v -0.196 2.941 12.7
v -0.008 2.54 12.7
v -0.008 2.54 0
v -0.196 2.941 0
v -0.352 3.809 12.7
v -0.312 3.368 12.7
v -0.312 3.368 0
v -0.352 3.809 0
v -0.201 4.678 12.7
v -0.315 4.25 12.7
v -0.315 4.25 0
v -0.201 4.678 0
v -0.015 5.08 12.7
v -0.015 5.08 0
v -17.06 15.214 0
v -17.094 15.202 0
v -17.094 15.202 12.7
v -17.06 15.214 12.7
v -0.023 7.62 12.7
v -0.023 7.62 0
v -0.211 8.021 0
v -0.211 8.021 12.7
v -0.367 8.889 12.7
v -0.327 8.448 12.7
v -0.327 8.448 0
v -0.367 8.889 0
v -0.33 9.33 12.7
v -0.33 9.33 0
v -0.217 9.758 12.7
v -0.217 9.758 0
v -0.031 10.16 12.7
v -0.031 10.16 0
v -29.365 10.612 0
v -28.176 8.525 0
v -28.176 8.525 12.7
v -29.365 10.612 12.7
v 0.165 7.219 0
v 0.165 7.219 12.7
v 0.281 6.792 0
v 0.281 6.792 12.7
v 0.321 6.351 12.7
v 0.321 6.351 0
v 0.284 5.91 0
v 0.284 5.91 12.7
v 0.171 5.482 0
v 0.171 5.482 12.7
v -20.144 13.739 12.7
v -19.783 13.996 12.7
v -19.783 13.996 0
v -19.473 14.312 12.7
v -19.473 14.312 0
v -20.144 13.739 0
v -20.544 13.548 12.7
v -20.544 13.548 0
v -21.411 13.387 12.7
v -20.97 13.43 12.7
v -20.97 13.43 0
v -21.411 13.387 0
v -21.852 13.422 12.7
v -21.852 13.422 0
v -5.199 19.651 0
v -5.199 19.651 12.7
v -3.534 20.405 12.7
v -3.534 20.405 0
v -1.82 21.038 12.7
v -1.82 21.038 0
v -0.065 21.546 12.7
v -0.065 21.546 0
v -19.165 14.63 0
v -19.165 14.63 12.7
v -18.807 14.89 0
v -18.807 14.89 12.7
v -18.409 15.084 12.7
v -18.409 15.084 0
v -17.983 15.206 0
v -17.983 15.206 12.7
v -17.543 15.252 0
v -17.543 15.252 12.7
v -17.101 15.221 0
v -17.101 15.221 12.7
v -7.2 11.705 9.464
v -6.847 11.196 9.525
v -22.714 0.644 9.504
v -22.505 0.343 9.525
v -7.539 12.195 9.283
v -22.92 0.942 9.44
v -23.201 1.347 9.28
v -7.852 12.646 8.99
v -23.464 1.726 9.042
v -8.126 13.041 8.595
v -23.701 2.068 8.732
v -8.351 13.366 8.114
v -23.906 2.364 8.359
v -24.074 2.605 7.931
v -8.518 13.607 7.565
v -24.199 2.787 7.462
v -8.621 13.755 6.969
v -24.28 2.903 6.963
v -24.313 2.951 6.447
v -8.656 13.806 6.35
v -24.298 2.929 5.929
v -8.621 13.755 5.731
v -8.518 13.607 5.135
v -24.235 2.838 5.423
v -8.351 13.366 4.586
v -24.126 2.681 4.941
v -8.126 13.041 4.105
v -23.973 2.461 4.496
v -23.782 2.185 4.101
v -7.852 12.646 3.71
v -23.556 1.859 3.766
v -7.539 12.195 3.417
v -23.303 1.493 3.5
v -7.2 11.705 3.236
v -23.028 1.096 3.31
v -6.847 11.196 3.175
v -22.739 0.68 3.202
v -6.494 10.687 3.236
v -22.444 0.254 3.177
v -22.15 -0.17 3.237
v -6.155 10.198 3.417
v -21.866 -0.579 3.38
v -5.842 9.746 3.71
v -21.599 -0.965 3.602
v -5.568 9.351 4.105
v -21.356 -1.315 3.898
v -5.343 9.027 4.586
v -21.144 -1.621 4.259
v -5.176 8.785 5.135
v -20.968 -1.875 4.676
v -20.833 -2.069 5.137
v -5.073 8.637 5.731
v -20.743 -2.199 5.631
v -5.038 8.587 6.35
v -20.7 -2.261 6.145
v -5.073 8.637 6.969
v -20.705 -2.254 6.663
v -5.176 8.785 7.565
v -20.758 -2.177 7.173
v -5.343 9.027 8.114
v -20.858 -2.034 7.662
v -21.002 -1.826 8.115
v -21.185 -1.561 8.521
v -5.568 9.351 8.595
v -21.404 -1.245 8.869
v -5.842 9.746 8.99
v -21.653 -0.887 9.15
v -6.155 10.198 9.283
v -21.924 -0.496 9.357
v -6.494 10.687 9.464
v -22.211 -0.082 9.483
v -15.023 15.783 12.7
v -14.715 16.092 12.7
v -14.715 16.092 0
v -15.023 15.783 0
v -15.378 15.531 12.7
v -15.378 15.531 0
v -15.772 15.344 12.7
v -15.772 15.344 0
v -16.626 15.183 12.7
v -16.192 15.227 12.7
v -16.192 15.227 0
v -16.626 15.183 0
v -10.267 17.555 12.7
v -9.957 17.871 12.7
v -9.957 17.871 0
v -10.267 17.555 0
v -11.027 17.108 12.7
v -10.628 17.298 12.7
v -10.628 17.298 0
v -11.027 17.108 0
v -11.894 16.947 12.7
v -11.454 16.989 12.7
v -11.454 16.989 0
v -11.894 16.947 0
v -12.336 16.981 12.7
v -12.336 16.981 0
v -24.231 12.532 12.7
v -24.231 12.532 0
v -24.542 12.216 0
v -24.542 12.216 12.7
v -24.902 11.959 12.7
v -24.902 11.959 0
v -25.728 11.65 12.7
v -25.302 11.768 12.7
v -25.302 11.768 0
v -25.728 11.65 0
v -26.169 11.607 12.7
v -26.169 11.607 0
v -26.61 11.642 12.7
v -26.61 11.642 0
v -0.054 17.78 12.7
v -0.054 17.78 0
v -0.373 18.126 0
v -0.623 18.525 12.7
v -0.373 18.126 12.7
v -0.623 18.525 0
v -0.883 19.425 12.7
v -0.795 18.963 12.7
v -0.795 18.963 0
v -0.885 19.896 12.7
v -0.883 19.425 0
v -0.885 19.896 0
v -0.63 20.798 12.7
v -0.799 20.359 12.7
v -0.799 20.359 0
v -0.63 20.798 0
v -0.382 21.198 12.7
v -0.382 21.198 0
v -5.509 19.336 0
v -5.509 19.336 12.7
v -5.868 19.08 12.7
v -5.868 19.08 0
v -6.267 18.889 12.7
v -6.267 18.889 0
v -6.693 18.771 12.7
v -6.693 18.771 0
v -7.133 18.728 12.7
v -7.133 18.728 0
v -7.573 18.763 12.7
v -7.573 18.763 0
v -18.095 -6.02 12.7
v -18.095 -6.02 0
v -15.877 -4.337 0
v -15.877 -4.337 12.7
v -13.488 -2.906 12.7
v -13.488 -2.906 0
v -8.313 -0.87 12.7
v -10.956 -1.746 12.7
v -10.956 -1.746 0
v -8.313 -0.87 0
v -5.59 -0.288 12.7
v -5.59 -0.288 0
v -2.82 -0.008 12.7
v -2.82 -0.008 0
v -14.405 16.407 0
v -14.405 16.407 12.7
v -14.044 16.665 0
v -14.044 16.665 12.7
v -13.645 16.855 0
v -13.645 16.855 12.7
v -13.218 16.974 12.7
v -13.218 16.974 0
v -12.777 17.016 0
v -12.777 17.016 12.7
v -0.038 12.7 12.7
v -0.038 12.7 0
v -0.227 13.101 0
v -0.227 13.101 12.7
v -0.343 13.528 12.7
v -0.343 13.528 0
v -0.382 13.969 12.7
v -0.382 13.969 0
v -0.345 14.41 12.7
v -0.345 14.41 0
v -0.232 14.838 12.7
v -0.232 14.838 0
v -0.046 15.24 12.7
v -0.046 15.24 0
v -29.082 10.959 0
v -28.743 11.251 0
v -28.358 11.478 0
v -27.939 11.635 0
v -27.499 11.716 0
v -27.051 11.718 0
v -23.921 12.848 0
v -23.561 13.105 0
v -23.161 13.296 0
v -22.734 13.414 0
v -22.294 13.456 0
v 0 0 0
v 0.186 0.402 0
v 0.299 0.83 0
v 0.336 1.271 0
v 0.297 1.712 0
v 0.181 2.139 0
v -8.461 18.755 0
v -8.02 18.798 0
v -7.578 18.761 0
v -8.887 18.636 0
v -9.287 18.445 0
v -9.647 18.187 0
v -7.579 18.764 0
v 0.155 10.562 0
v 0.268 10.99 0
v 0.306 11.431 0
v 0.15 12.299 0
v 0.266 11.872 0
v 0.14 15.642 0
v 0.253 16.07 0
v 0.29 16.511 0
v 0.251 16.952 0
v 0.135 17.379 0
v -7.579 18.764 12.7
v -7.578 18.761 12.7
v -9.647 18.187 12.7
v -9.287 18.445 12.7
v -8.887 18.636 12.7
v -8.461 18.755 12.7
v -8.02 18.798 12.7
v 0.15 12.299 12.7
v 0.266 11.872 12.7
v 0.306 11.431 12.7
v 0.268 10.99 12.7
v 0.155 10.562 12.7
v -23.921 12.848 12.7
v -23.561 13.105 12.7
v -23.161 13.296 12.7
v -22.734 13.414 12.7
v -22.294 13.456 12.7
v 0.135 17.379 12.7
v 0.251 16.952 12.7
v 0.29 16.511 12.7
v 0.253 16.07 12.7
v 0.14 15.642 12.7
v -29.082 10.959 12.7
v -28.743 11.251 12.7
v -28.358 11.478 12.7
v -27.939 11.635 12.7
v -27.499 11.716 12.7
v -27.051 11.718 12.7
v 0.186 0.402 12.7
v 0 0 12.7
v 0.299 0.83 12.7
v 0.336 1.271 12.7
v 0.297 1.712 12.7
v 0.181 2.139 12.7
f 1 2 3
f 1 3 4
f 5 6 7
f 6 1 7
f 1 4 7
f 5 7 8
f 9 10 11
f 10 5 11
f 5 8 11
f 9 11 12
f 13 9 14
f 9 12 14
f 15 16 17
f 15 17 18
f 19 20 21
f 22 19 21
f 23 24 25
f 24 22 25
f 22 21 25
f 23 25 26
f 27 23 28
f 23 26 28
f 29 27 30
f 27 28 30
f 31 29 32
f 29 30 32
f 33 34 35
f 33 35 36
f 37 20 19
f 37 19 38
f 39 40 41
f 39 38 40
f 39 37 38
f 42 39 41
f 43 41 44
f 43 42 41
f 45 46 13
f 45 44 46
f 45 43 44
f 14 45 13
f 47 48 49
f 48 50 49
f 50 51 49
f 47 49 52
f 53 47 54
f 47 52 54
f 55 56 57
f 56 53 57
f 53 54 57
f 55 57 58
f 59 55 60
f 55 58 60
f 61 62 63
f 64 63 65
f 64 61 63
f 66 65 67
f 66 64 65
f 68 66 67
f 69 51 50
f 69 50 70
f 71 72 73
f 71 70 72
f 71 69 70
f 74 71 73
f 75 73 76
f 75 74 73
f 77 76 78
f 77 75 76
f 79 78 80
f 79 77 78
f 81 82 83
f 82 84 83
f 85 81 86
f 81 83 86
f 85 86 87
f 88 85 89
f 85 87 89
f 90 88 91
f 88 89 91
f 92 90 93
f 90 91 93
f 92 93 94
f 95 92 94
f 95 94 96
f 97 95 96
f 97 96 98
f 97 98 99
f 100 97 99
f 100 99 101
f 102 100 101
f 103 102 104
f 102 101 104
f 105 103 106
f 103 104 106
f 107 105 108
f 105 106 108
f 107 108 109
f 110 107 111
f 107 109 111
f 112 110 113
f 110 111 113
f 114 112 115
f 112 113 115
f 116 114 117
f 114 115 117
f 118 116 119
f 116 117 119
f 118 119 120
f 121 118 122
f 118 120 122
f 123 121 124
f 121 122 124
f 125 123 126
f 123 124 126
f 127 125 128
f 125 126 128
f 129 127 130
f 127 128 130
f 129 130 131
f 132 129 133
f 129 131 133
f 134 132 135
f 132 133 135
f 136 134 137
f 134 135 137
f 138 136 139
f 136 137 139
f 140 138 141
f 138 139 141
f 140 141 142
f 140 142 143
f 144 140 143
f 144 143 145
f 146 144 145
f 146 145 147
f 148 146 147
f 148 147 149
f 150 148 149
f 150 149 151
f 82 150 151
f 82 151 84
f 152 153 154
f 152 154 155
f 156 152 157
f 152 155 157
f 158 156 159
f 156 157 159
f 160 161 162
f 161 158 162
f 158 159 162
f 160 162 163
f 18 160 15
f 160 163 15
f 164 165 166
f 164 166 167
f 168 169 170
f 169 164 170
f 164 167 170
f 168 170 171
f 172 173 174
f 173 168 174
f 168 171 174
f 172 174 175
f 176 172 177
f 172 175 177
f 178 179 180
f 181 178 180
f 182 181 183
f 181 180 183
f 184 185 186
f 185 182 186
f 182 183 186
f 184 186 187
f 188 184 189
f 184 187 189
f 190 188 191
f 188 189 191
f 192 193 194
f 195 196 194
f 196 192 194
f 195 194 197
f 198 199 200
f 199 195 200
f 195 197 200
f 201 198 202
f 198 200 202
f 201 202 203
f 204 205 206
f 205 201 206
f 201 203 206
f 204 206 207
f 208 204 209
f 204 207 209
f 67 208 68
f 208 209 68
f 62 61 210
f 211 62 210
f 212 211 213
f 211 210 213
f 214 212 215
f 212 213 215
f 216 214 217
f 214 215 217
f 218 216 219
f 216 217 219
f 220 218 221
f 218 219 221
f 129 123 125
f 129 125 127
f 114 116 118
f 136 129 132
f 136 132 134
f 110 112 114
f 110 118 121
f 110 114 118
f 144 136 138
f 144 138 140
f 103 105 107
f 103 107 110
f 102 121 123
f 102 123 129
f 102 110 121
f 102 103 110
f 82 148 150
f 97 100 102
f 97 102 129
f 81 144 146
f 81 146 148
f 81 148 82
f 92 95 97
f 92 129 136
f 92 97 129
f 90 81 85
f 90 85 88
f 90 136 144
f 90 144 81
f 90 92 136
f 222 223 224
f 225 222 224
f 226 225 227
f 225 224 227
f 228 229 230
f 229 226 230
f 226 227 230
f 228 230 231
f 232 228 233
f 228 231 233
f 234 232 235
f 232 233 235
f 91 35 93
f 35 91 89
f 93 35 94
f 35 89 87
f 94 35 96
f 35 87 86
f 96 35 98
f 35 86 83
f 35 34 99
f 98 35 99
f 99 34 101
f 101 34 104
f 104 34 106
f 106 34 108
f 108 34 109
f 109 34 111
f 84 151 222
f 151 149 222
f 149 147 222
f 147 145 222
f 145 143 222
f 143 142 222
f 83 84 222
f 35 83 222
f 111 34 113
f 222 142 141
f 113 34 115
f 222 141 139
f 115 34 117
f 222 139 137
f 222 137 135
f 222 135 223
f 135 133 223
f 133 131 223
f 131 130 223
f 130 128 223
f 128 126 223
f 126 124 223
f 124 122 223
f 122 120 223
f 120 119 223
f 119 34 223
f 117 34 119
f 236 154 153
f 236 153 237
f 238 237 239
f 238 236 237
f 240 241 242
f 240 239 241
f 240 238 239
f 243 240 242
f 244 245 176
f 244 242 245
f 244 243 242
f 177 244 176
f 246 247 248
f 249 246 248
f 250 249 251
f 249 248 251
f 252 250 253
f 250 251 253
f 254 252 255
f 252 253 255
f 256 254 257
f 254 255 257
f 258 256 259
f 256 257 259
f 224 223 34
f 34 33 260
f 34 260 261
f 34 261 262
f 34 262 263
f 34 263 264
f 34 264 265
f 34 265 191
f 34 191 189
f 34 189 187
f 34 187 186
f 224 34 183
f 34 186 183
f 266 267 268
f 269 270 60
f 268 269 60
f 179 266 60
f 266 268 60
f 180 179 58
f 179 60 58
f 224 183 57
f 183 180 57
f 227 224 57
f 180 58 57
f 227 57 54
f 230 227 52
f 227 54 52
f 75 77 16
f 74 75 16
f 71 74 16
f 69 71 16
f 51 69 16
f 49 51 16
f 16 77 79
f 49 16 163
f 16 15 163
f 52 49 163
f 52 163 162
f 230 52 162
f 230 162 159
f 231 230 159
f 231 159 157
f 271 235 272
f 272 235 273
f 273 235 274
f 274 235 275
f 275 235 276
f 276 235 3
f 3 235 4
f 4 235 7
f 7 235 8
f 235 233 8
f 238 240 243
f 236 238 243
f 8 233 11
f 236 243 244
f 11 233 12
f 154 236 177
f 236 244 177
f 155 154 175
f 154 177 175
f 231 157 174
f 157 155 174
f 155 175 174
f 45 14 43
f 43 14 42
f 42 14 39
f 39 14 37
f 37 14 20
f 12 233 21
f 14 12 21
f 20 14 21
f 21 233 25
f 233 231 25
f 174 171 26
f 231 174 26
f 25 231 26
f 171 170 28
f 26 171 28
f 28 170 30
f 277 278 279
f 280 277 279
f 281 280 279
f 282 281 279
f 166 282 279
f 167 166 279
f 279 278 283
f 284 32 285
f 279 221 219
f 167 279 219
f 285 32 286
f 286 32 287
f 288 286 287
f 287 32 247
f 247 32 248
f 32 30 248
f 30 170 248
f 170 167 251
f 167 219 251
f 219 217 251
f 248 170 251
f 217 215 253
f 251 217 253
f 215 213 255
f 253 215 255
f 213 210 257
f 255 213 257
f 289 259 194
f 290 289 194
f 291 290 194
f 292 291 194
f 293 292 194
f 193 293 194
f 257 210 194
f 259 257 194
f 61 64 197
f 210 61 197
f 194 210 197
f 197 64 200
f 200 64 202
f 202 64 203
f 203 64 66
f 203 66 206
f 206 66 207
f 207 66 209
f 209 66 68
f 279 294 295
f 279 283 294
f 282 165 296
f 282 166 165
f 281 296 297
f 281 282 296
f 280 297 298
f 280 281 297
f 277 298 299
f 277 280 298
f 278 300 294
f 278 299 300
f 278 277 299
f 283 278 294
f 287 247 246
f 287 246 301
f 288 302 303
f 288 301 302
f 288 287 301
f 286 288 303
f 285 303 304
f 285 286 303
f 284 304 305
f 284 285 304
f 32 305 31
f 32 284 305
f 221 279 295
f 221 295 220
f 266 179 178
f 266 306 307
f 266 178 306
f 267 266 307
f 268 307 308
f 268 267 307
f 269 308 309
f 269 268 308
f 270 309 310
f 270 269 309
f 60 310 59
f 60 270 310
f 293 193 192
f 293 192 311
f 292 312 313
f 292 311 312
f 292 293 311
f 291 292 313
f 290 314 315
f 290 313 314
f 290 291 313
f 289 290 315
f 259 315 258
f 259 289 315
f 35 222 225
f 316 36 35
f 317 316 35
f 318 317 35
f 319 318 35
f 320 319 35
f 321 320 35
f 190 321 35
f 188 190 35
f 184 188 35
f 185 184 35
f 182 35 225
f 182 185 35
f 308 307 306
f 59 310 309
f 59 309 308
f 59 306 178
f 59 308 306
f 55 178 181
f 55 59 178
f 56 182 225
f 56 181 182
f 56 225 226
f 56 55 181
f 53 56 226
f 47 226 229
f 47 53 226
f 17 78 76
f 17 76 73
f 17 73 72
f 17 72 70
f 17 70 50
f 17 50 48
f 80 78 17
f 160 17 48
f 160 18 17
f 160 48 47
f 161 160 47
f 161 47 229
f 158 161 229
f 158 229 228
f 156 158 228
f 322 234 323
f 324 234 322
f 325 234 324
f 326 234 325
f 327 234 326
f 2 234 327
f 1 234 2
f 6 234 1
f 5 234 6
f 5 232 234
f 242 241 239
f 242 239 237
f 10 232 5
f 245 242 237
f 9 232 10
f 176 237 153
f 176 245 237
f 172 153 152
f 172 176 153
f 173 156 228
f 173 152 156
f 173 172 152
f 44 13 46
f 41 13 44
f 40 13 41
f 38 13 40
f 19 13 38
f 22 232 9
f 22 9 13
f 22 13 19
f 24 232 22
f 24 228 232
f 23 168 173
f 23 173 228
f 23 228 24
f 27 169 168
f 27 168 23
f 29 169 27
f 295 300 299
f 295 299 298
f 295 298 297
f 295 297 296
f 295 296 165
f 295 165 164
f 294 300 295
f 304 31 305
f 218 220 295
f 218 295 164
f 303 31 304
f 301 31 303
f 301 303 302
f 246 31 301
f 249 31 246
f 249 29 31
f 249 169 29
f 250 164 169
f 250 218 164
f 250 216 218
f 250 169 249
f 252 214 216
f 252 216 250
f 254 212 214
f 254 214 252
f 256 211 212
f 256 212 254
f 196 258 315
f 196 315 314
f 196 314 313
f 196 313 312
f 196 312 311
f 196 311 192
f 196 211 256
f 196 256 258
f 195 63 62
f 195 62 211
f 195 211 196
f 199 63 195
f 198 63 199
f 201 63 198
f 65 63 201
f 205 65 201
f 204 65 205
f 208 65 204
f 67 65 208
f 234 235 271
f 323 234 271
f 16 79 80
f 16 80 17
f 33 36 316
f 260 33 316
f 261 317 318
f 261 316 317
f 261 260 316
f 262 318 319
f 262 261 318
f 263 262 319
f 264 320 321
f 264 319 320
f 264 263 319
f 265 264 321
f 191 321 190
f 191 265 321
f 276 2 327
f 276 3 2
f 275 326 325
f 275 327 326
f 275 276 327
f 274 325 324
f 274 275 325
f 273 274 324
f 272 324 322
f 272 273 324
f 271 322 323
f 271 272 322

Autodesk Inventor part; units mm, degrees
ref_plane "YZ Plane" through (0, 0, 0) normal (1, 0, 0) x (0, 1, 0)
ref_plane "XZ Plane" through (0, 0, 0) normal (0, 1, 0) x (-1, 0, 0)
ref_plane "XY Plane" through (0, 0, 0) normal (0, 0, 1) x (1, 0, 0)
sketch "Sketch1" plane through (0, 0, 0) normal (0, 0, 1) x (1, 0, 0)
  line L0 (0, 0) -> (-1.6764, 0)
  line L1 (-2.8195, 0) -> (-2.8195, -0.0085)
  arc A0 (-2.8195, -0.0085) -> (-18.0949, -6.0198) centre (-1.6549, -25.3818) ccw
  line L2 (-28.1765, 8.5246) -> (-18.0949, -6.0198)
  line L3 (-28.1765, 8.5246) -> (-29.3649, 10.6117)
  line L4 (-17.1011, 15.221) -> (-17.0941, 15.2016)
  line L5 (-9.9296, 17.7969) -> (-9.9234, 17.7799)
  line L6 (-7.5786, 18.7636) -> (-7.5777, 18.7612)
  line L7 (-2.8195, -0.0085) -> (0, 0)
  line L8 (-0.0077, 2.54) -> (0, 0)
  arc A1 (-26.6104, 11.642) -> (-29.3649, 10.6117) centre (-27.262, 9.187) ccw
  arc A2 (-26.6104, 11.642) -> (-24.2313, 12.5319) centre (-26.1915, 14.1472) ccw
  arc A3 (-21.8523, 13.4218) -> (-24.2313, 12.5319) centre (-22.2712, 10.9166) ccw
  arc A4 (-21.8523, 13.4218) -> (-19.4732, 14.3117) centre (-21.4333, 15.927) ccw
  arc A5 (-17.1011, 15.221) -> (-19.4732, 14.3117) centre (-17.4998, 12.7125) ccw
  arc A6 (-17.1011, 15.221) -> (-14.715, 16.0915) centre (-16.6619, 17.7227) ccw
  arc A7 (-12.3359, 16.9814) -> (-14.715, 16.0915) centre (-12.7548, 14.4762) ccw
  arc A8 (-12.3359, 16.9814) -> (-9.9568, 17.8713) centre (-11.917, 19.4866) ccw
  arc A9 (-7.5786, 18.7636) -> (-9.9568, 17.8713) centre (-7.9949, 16.258) ccw
  arc A10 (-7.5786, 18.7636) -> (-5.1986, 19.6511) centre (-7.1571, 21.2684) ccw
  arc A11 (-0.065, 21.5463) -> (-5.1986, 19.6511) centre (6.1141, -3.0906) ccw
  arc A12 (-0.065, 21.5463) -> (-0.0536, 17.7799) centre (1.6451, 19.6683) ccw
  arc A13 (-0.046, 15.2399) -> (-0.0536, 17.7799) centre (-2.2495, 16.5033) ccw
  arc A14 (-0.046, 15.2399) -> (-0.0383, 12.6999) centre (2.1575, 13.9766) ccw
  arc A15 (-0.0307, 10.16) -> (-0.0383, 12.6999) centre (-2.2342, 11.4233) ccw
  arc A16 (-0.0307, 10.16) -> (-0.023, 7.62) centre (2.1729, 8.8966) ccw
  arc A17 (-0.0153, 5.08) -> (-0.023, 7.62) centre (-2.2189, 6.3433) ccw
  arc A18 (-0.0153, 5.08) -> (-0.0077, 2.54) centre (2.1882, 3.8166) ccw
  arc A19 (0, 0) -> (-0.0077, 2.54) centre (-2.2035, 1.2634) ccw
  line L9 (-0.275, 21.4927) -> (-0.0651, 21.5712)
  line L10 (-7.5777, 18.7612) -> (-7.5734, 18.7628)
  line L11 (-29.3649, 10.6117) -> (-26.6104, 11.642)
  line L12 (-17.0941, 15.2016) -> (-17.0604, 15.2142)
  line L13 (-0.0651, 21.5712) -> (-0.065, 21.5463)
  line L14 (-0.0077, 2.54) -> (0, 0)
  line L15 (-2.8195, 0) -> (-2.8195, 3.7275)
  dimension "d14" = 10.6117
  dimension "d15" = 29.3649
  dimension "d21" = 21.5712
  dimension "d22" = 29.2998
  dimension "d25" = 6.0198
  dimension "d26" = 18.0949
  dimension "d27" = 0
  dimension "d30" = 2.54
  dimension "d40" = 2.54
  dimension "d41" = 2.54
  dimension "d42" = 2.54
  dimension "d43" = 2.54
  dimension "d44" = 2.54
  dimension "d45" = 2.54
  dimension "d46" = 2.54
  dimension "d47" = 2.54
  dimension "d48" = 2.54
  dimension "d49" = 2.54
  dimension "d50" = 25.4
  dimension "d51" = 2.54
  dimension "d52" = 2.54
  dimension "d53" = 2.54
  dimension "d54" = 2.54
  dimension "d55" = 2.54
  dimension "d56" = 2.54
  dimension "d57" = 2.54
  dimension "d58" = 2.54
extrude "Extrusion1" add sketch "Sketch1" along normal blind 12.7 contours A0 L2 L3 L11 A2 A3 A4 A5 L4 L12 A6 A7 A8 A9 L6 L10 A10 A11 A12 A13 A14 A15 A16 A17 A18 L8 L7 | L8 A19 | A1 L11
sketch "Sketch2" plane through (-18.0949, -6.0198, 0) normal (-0.8219, -0.5697, 0) x (0, 0, 1)
  line L0 (0, 17.6968) -> (0, 0) projected
  line L1 (12.7, 17.751) -> (0, 17.751)
  line L2 (0, 17.751) -> (0, 0)
  line L3 (0, 0) -> (12.7, 0)
  line L4 (12.7, 0) -> (12.7, 17.751)
  line L5 (12.7, 0.1215) -> (0, 0.1215) projected
  line L6 (12.7, 17.751) -> (6.35, 17.751)
  line L7 (6.35, 17.751) -> (6.35, 0.1215)
  line L8 (6.35, 0.1215) -> (12.7, 0.1215)
  line L9 (12.7, 0.1215) -> (12.7, 17.751)
  circle A0 centre (6.35, 7.7415) radius 3.175
  point P0 (0, -5.3609)
  dimension "d62" = 6.35
  dimension "d63" = 7.62
extrude "Extrusion2" cut sketch "Sketch2" against normal blind 19.05 contours A0 L7 | L7 A0
properties part number "tippa dis claw"
